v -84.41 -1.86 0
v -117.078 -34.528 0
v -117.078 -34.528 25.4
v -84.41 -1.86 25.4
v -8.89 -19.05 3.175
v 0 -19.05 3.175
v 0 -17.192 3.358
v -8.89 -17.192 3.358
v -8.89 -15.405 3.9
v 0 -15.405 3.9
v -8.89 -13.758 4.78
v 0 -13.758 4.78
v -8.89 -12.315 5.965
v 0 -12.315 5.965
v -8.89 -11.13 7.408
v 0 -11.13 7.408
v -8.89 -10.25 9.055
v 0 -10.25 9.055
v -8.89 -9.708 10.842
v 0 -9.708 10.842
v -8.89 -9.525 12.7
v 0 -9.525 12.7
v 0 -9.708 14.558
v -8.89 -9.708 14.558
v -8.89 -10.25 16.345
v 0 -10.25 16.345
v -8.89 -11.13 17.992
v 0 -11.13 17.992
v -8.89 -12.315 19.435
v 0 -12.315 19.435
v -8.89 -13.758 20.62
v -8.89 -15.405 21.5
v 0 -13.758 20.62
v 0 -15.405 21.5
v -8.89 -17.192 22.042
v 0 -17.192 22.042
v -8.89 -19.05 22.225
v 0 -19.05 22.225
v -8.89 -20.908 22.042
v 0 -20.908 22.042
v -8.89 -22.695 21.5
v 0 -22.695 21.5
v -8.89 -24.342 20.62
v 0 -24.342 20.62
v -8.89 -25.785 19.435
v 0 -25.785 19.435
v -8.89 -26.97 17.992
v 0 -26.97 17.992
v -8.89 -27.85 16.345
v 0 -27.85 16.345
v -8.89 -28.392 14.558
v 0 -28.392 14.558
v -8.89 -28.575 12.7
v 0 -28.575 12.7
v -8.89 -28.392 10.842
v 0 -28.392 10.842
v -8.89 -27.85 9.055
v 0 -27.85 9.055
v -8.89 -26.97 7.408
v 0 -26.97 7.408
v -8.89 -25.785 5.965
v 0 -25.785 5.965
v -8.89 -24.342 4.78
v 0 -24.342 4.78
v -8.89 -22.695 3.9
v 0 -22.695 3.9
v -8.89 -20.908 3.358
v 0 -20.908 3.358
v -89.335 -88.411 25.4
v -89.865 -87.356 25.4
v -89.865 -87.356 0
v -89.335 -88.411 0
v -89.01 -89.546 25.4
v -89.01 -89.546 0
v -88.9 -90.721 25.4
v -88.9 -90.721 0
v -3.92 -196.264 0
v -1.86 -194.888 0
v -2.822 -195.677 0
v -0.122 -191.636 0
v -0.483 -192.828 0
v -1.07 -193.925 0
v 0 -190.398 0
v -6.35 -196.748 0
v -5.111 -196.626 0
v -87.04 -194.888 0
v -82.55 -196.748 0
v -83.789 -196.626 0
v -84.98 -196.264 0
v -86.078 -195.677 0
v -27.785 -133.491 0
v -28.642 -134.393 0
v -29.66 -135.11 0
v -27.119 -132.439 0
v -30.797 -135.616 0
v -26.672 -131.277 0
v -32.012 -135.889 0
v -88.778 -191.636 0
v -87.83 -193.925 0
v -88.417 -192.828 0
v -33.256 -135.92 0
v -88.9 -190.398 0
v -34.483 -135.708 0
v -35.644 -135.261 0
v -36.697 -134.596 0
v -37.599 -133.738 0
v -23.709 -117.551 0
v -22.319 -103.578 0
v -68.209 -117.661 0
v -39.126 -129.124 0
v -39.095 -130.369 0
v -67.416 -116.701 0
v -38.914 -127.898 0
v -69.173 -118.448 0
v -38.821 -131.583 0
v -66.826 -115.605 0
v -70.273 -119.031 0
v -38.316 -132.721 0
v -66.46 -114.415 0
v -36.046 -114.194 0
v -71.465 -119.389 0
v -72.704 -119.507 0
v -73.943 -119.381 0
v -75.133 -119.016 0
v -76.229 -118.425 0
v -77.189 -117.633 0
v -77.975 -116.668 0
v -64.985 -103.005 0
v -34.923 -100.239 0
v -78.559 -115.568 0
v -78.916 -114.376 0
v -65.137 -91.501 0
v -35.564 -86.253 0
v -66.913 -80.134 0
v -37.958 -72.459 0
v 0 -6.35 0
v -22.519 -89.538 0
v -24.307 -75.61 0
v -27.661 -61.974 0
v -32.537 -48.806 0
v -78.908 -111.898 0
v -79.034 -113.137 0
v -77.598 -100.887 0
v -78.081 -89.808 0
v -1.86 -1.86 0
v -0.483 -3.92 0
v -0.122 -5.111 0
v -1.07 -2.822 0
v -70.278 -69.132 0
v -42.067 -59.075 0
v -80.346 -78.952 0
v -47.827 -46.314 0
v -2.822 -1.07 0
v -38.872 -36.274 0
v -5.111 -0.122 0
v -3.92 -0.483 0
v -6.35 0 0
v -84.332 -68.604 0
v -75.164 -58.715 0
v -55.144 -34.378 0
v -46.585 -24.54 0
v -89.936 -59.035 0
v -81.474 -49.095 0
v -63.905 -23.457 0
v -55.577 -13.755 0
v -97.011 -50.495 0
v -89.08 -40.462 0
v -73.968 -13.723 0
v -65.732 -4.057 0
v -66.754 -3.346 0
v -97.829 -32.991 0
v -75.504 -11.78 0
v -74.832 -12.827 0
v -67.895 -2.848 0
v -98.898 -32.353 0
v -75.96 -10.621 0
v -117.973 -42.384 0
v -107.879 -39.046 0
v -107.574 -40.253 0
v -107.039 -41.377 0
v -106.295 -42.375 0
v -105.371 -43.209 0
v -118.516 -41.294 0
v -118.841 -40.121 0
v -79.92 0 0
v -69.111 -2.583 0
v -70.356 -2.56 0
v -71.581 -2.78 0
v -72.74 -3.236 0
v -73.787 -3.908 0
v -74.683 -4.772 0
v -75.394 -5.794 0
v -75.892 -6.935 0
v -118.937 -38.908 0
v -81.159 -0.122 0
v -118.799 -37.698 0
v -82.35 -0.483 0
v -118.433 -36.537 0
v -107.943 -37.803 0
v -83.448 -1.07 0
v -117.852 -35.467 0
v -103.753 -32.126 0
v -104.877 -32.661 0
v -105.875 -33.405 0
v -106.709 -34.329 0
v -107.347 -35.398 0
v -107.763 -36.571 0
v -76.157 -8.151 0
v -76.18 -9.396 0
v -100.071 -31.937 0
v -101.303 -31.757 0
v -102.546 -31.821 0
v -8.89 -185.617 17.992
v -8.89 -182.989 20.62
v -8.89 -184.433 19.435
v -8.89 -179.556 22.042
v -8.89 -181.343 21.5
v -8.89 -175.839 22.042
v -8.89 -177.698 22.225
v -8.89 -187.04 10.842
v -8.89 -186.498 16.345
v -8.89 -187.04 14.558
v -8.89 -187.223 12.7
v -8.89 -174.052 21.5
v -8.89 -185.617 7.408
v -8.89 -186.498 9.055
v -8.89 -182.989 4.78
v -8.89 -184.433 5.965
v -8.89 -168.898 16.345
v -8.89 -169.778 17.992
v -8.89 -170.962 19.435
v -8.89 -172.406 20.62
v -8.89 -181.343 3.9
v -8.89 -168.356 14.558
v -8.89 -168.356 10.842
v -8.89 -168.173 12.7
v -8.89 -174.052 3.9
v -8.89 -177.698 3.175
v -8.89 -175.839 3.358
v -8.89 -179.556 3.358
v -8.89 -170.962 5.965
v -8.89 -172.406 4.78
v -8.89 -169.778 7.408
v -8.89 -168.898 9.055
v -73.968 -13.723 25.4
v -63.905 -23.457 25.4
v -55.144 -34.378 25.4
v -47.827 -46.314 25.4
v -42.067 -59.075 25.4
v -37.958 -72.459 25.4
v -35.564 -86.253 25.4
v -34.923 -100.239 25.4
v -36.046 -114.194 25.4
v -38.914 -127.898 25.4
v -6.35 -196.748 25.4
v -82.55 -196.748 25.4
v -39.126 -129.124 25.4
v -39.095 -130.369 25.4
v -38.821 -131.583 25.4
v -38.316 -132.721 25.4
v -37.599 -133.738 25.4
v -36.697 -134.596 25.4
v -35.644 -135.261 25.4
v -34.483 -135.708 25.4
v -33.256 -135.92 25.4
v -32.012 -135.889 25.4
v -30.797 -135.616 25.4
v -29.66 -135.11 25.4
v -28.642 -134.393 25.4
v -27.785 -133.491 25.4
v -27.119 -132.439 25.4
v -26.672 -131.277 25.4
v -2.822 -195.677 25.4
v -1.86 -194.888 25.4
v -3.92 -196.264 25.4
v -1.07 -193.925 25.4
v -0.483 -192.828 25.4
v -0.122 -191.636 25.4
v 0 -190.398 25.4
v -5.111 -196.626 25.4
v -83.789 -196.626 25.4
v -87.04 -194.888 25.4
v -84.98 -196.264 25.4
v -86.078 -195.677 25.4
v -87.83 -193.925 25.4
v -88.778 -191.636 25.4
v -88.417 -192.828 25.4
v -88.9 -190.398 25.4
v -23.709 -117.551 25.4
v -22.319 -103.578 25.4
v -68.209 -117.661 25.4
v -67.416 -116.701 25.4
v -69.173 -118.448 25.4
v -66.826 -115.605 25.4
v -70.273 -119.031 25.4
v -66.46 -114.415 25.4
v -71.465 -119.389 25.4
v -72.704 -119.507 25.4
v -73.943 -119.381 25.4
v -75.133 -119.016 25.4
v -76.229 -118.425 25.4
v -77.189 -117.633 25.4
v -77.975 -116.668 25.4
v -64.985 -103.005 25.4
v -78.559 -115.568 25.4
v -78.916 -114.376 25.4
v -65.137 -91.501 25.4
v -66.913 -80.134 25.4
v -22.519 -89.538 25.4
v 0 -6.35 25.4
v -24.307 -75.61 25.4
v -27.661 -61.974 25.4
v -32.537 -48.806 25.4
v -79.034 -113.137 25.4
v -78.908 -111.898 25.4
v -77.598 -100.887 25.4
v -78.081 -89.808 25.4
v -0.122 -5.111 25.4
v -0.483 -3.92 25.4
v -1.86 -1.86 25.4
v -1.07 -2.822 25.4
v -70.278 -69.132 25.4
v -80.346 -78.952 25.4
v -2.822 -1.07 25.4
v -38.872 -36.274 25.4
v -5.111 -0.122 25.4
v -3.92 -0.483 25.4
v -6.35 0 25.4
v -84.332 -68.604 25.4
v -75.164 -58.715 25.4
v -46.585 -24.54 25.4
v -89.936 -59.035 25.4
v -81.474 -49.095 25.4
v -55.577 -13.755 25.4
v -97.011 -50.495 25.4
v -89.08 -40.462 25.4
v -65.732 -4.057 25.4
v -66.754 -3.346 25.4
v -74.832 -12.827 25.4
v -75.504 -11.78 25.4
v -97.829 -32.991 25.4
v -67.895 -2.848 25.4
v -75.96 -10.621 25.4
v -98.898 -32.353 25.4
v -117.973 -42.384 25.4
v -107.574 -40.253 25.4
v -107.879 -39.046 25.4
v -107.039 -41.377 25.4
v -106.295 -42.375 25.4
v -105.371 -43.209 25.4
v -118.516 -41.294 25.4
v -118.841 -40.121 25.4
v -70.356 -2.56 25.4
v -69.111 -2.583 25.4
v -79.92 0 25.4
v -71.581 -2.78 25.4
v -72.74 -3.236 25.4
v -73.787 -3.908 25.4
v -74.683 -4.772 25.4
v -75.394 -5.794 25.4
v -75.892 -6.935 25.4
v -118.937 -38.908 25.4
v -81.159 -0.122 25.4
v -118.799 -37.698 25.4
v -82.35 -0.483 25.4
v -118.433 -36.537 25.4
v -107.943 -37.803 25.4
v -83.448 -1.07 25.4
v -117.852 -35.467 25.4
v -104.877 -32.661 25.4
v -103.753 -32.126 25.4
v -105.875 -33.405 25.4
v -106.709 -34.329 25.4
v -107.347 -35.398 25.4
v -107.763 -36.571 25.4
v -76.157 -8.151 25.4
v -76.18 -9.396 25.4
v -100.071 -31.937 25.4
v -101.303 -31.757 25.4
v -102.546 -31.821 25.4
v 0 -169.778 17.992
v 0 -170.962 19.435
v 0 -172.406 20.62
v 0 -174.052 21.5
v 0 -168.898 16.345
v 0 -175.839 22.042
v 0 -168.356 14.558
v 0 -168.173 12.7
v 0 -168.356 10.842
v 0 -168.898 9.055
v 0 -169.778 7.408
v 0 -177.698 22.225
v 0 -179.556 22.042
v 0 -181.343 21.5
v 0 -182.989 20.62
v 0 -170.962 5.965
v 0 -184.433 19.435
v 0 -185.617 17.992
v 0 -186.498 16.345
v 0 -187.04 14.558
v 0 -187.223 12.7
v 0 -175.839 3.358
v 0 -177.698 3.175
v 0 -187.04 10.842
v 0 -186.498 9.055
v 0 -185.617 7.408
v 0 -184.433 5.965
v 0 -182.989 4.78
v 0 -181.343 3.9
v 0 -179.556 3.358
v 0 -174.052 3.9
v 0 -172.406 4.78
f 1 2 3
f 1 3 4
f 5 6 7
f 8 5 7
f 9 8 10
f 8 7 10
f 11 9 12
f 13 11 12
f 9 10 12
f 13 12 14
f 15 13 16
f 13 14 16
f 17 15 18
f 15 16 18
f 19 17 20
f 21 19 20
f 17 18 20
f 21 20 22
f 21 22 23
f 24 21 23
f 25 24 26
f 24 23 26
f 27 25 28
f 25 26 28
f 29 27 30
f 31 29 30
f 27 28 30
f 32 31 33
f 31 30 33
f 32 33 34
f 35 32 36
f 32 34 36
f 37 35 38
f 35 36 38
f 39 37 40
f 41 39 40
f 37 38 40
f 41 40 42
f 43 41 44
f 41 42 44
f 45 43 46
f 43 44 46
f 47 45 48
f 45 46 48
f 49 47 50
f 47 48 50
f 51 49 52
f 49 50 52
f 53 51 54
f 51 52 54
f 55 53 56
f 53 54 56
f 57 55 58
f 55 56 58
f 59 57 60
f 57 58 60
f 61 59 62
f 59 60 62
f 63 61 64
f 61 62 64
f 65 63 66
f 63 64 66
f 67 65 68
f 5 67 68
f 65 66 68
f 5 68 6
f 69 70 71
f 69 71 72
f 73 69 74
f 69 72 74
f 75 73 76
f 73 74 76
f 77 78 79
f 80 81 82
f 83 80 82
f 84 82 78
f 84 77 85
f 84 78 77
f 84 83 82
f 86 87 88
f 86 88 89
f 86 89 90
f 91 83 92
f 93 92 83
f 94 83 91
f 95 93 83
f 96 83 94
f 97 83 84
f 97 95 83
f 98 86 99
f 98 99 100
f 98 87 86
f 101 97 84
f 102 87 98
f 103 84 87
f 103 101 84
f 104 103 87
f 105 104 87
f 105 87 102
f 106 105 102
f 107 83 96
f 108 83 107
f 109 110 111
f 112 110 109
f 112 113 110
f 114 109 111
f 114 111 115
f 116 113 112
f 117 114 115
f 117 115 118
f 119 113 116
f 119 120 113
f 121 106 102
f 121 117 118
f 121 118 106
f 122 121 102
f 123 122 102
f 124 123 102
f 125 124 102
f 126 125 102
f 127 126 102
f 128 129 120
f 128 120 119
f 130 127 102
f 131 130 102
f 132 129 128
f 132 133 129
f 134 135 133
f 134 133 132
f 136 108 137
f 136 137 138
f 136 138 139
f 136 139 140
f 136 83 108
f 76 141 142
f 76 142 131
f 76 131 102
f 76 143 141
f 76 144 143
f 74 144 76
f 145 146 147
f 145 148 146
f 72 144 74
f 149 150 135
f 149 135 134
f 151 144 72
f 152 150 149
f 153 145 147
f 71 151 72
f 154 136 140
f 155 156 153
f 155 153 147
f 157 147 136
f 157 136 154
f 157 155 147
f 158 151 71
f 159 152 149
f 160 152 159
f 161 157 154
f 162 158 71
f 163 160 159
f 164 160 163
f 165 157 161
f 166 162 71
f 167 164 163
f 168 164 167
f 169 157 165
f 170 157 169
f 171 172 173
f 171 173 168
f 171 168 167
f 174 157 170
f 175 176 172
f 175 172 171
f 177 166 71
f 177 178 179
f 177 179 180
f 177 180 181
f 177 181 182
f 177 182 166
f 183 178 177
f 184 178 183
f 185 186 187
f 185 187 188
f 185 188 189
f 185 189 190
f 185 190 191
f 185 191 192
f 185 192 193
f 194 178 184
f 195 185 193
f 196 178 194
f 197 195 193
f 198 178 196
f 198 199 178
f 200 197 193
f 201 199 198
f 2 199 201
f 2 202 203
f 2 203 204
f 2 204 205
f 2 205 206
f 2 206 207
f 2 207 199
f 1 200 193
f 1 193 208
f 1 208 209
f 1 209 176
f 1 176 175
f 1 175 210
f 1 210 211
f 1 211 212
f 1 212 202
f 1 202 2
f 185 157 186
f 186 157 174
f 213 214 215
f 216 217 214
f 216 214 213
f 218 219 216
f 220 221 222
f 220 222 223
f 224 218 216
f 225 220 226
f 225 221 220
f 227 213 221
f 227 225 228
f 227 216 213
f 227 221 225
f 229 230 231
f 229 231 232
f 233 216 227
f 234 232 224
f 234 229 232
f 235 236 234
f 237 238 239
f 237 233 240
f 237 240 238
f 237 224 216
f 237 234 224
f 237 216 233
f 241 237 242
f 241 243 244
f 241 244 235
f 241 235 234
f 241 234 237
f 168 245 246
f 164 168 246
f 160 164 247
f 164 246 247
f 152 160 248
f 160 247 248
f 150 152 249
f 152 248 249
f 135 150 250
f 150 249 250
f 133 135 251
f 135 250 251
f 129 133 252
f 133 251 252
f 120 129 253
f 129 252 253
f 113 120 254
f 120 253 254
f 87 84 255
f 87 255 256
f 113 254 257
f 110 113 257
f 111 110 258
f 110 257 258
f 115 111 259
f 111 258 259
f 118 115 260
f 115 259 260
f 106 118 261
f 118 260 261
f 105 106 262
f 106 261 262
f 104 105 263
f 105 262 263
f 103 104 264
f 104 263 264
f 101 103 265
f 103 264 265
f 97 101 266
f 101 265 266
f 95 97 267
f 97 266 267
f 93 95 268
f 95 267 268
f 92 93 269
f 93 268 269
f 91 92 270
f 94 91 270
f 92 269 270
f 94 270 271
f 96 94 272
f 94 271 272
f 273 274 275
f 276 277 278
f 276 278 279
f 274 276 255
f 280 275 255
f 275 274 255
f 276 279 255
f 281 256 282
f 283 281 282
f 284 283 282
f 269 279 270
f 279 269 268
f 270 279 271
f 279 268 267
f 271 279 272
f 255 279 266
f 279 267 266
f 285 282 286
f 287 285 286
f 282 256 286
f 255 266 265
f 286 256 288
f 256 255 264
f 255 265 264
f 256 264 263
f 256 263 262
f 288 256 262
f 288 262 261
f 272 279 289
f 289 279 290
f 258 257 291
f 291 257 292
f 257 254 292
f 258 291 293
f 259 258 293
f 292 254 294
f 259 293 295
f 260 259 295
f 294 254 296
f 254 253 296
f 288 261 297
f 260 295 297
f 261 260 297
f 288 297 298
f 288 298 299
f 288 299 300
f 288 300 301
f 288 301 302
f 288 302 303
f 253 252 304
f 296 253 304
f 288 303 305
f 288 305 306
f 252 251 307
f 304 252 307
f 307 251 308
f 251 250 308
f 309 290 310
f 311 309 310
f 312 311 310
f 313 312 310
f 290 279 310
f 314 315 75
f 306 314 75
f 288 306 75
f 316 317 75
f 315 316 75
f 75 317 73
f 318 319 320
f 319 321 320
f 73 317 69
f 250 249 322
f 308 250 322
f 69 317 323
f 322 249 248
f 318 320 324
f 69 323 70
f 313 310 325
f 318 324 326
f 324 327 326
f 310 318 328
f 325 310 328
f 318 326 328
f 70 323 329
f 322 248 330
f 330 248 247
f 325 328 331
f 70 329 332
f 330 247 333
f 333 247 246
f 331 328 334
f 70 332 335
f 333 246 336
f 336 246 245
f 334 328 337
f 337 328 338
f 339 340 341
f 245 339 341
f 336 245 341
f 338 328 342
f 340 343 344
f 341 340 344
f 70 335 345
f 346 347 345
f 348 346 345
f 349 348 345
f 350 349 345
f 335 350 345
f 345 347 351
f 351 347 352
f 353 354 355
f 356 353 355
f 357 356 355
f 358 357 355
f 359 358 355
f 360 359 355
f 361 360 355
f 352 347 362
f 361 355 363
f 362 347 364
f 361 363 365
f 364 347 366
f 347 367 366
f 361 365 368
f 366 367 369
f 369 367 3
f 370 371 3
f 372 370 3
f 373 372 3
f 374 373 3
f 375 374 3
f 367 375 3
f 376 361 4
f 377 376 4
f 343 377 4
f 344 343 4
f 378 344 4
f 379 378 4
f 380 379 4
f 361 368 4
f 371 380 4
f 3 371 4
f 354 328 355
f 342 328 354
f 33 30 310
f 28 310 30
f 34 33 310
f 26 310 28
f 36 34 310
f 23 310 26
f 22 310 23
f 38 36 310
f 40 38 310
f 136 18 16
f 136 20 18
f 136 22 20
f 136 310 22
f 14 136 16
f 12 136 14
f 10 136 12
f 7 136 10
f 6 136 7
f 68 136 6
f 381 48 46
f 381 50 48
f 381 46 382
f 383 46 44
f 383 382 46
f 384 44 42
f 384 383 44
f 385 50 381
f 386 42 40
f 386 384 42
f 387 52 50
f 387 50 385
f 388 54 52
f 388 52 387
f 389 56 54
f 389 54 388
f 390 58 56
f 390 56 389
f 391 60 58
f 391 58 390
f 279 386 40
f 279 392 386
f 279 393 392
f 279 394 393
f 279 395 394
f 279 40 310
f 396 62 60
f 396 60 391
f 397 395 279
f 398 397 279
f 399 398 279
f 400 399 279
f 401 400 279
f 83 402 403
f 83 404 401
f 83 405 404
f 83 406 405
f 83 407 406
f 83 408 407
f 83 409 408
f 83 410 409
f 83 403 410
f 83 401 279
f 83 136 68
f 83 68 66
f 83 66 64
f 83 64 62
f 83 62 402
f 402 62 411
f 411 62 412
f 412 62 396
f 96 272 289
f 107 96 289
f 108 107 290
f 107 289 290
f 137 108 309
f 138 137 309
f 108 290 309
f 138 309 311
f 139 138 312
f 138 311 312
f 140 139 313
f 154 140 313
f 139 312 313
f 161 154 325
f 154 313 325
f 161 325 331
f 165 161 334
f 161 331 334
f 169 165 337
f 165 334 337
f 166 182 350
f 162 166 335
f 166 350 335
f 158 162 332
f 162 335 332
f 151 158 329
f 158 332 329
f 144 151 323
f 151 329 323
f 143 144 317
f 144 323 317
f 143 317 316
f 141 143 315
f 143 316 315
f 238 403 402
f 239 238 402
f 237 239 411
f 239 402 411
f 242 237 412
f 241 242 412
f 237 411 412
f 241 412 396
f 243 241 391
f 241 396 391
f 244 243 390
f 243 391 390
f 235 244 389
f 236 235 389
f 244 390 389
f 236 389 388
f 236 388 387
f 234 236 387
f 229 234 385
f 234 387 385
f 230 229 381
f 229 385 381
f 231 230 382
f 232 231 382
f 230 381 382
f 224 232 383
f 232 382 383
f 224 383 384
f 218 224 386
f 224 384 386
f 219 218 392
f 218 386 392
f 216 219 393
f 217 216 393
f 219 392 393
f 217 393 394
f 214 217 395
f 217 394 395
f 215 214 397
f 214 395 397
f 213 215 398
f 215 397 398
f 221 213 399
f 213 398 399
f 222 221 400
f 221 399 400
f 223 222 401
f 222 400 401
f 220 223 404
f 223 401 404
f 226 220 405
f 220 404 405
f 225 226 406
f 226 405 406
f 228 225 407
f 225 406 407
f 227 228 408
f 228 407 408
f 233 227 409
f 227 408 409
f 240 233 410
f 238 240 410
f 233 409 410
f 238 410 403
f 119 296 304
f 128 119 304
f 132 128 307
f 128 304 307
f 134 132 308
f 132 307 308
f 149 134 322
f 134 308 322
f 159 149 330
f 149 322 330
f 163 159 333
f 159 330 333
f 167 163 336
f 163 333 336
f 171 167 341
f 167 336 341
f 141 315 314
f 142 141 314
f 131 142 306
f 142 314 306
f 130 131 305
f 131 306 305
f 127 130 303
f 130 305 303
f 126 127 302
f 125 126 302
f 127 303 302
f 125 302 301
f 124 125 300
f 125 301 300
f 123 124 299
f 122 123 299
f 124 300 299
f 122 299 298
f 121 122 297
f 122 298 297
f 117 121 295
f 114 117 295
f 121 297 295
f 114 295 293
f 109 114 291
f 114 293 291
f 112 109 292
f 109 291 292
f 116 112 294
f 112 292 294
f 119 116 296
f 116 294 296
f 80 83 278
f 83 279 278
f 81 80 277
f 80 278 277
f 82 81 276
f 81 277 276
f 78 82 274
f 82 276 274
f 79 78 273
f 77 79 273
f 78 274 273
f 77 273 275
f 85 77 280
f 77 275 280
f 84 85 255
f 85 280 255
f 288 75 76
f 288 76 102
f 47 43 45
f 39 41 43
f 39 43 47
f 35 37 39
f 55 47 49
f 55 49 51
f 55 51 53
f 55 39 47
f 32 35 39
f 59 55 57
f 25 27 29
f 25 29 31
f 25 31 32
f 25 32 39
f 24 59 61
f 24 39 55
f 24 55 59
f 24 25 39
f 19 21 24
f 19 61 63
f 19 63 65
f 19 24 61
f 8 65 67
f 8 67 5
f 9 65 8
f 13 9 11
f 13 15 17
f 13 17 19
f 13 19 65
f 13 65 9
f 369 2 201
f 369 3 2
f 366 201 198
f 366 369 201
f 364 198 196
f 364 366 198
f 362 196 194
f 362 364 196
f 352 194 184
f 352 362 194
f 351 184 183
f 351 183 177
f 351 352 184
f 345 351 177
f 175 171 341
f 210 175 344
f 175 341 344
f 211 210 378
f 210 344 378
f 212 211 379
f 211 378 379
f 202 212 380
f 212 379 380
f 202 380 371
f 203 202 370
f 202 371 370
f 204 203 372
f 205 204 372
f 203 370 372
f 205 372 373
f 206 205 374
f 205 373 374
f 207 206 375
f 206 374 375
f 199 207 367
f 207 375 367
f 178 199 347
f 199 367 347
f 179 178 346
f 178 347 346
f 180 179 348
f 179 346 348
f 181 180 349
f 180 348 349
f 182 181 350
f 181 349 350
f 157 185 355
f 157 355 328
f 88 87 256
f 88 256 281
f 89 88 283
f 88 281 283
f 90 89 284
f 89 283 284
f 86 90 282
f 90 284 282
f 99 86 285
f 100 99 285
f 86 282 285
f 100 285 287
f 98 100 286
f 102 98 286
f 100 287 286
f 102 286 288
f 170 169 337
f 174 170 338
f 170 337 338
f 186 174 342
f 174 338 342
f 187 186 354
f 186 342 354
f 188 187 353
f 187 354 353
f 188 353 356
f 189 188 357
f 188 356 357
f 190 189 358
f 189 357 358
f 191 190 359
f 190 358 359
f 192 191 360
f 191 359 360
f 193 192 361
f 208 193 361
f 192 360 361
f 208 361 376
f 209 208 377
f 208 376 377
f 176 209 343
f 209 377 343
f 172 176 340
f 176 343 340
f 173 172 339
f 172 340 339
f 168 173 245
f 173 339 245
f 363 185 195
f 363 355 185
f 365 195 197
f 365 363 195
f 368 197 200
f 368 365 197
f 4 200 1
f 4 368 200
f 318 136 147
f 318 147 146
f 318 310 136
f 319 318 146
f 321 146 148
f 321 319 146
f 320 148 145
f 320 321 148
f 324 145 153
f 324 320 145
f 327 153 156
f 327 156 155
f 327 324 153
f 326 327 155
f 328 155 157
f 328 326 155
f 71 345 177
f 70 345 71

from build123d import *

# Parameters (mm, degrees)
BOSS_EXTRUDE1_DEPTH = 25.4
SKETCH2_R           = 9.525
CUT_EXTRUDE1_DEPTH  = 8.89
CUT_EXTRUDE2_DEPTH  = 26.4
CUT_EXTRUDE3_DEPTH  = 26.4
FILLET1_R           = 6.35


with BuildPart() as part:
    # Sketch1 → Boss-Extrude1 (new body)
    with BuildSketch(Plane.XY):
        Polygon((0, 0), (0, -196.747553987), (-88.9, -196.747553987), (-120.65, -158.647553987), (-120.65, -38.1), (-82.55, 0), align=None)
    extrude(amount=BOSS_EXTRUDE1_DEPTH)

    # Sketch2 → Cut-Extrude1 (cut)
    with BuildSketch(Plane(origin=(0, 0, 0), x_dir=(0, 0, -1), z_dir=(1, 0, 0))):
        with Locations((-12.7, -19.05)):
            Circle(SKETCH2_R)
        with Locations((-12.7, -177.697553987)):
            Circle(SKETCH2_R)
    extrude(amount=-CUT_EXTRUDE1_DEPTH, mode=Mode.SUBTRACT)

    # Sketch3 → Cut-Extrude2 (cut, through all)
    with BuildSketch(Plane.XY.offset(25.4)):
        with BuildLine():
            ThreePointArc((-66.460403821, -114.415261768), (-70.27820982, -69.131547214), (-97.829036835, -32.990955392))
            ThreePointArc((-97.829036835, -32.990955392), (-106.709044608, -34.329036835), (-105.370963165, -43.209044608))
            ThreePointArc((-105.370963165, -43.209044608), (-82.129181306, -73.697122187), (-78.908493442, -111.898306307))
            ThreePointArc((-78.908493442, -111.898306307), (-73.942926362, -119.380828848), (-66.460403821, -114.415261768))
        make_face()
        with BuildLine():
            ThreePointArc((-26.672013645, -131.277107348), (-27.661158876, -61.974397079), (-65.731714588, -4.056551411))
            ThreePointArc((-65.731714588, -4.056551411), (-74.683448589, -4.771714588), (-73.968285412, -13.723448589))
            ThreePointArc((-73.968285412, -13.723448589), (-39.80183232, -65.701869188), (-38.914123079, -127.897646353))
            ThreePointArc((-38.914123079, -127.897646353), (-34.48279886, -135.708431567), (-26.672013645, -131.277107348))
        make_face()
    extrude(amount=-CUT_EXTRUDE2_DEPTH, mode=Mode.SUBTRACT)

    # Sketch4 → Cut-Extrude3 (cut, through all)
    with BuildSketch(Plane.XY.offset(25.4)):
        Polygon((-120.65, -38.1), (-88.9, -88.9), (-88.9, -196.747553987), (-120.65, -158.647553987), align=None)
    extrude(amount=-CUT_EXTRUDE3_DEPTH, mode=Mode.SUBTRACT)

    # Fillet1
    fillet1_edges = [part.edges().sort_by_distance(p)[0] for p in [
        (-88.9, -196.747553987, 12.7),
        (-120.65, -38.1, 12.7),
        (-82.55, 0, 12.7),
        (0, 0, 12.7),
        (0, -196.747553987, 12.7),
        (-88.9, -88.9, 12.7),
    ]]
    fillet(fillet1_edges, radius=FILLET1_R)


solid = part.part
